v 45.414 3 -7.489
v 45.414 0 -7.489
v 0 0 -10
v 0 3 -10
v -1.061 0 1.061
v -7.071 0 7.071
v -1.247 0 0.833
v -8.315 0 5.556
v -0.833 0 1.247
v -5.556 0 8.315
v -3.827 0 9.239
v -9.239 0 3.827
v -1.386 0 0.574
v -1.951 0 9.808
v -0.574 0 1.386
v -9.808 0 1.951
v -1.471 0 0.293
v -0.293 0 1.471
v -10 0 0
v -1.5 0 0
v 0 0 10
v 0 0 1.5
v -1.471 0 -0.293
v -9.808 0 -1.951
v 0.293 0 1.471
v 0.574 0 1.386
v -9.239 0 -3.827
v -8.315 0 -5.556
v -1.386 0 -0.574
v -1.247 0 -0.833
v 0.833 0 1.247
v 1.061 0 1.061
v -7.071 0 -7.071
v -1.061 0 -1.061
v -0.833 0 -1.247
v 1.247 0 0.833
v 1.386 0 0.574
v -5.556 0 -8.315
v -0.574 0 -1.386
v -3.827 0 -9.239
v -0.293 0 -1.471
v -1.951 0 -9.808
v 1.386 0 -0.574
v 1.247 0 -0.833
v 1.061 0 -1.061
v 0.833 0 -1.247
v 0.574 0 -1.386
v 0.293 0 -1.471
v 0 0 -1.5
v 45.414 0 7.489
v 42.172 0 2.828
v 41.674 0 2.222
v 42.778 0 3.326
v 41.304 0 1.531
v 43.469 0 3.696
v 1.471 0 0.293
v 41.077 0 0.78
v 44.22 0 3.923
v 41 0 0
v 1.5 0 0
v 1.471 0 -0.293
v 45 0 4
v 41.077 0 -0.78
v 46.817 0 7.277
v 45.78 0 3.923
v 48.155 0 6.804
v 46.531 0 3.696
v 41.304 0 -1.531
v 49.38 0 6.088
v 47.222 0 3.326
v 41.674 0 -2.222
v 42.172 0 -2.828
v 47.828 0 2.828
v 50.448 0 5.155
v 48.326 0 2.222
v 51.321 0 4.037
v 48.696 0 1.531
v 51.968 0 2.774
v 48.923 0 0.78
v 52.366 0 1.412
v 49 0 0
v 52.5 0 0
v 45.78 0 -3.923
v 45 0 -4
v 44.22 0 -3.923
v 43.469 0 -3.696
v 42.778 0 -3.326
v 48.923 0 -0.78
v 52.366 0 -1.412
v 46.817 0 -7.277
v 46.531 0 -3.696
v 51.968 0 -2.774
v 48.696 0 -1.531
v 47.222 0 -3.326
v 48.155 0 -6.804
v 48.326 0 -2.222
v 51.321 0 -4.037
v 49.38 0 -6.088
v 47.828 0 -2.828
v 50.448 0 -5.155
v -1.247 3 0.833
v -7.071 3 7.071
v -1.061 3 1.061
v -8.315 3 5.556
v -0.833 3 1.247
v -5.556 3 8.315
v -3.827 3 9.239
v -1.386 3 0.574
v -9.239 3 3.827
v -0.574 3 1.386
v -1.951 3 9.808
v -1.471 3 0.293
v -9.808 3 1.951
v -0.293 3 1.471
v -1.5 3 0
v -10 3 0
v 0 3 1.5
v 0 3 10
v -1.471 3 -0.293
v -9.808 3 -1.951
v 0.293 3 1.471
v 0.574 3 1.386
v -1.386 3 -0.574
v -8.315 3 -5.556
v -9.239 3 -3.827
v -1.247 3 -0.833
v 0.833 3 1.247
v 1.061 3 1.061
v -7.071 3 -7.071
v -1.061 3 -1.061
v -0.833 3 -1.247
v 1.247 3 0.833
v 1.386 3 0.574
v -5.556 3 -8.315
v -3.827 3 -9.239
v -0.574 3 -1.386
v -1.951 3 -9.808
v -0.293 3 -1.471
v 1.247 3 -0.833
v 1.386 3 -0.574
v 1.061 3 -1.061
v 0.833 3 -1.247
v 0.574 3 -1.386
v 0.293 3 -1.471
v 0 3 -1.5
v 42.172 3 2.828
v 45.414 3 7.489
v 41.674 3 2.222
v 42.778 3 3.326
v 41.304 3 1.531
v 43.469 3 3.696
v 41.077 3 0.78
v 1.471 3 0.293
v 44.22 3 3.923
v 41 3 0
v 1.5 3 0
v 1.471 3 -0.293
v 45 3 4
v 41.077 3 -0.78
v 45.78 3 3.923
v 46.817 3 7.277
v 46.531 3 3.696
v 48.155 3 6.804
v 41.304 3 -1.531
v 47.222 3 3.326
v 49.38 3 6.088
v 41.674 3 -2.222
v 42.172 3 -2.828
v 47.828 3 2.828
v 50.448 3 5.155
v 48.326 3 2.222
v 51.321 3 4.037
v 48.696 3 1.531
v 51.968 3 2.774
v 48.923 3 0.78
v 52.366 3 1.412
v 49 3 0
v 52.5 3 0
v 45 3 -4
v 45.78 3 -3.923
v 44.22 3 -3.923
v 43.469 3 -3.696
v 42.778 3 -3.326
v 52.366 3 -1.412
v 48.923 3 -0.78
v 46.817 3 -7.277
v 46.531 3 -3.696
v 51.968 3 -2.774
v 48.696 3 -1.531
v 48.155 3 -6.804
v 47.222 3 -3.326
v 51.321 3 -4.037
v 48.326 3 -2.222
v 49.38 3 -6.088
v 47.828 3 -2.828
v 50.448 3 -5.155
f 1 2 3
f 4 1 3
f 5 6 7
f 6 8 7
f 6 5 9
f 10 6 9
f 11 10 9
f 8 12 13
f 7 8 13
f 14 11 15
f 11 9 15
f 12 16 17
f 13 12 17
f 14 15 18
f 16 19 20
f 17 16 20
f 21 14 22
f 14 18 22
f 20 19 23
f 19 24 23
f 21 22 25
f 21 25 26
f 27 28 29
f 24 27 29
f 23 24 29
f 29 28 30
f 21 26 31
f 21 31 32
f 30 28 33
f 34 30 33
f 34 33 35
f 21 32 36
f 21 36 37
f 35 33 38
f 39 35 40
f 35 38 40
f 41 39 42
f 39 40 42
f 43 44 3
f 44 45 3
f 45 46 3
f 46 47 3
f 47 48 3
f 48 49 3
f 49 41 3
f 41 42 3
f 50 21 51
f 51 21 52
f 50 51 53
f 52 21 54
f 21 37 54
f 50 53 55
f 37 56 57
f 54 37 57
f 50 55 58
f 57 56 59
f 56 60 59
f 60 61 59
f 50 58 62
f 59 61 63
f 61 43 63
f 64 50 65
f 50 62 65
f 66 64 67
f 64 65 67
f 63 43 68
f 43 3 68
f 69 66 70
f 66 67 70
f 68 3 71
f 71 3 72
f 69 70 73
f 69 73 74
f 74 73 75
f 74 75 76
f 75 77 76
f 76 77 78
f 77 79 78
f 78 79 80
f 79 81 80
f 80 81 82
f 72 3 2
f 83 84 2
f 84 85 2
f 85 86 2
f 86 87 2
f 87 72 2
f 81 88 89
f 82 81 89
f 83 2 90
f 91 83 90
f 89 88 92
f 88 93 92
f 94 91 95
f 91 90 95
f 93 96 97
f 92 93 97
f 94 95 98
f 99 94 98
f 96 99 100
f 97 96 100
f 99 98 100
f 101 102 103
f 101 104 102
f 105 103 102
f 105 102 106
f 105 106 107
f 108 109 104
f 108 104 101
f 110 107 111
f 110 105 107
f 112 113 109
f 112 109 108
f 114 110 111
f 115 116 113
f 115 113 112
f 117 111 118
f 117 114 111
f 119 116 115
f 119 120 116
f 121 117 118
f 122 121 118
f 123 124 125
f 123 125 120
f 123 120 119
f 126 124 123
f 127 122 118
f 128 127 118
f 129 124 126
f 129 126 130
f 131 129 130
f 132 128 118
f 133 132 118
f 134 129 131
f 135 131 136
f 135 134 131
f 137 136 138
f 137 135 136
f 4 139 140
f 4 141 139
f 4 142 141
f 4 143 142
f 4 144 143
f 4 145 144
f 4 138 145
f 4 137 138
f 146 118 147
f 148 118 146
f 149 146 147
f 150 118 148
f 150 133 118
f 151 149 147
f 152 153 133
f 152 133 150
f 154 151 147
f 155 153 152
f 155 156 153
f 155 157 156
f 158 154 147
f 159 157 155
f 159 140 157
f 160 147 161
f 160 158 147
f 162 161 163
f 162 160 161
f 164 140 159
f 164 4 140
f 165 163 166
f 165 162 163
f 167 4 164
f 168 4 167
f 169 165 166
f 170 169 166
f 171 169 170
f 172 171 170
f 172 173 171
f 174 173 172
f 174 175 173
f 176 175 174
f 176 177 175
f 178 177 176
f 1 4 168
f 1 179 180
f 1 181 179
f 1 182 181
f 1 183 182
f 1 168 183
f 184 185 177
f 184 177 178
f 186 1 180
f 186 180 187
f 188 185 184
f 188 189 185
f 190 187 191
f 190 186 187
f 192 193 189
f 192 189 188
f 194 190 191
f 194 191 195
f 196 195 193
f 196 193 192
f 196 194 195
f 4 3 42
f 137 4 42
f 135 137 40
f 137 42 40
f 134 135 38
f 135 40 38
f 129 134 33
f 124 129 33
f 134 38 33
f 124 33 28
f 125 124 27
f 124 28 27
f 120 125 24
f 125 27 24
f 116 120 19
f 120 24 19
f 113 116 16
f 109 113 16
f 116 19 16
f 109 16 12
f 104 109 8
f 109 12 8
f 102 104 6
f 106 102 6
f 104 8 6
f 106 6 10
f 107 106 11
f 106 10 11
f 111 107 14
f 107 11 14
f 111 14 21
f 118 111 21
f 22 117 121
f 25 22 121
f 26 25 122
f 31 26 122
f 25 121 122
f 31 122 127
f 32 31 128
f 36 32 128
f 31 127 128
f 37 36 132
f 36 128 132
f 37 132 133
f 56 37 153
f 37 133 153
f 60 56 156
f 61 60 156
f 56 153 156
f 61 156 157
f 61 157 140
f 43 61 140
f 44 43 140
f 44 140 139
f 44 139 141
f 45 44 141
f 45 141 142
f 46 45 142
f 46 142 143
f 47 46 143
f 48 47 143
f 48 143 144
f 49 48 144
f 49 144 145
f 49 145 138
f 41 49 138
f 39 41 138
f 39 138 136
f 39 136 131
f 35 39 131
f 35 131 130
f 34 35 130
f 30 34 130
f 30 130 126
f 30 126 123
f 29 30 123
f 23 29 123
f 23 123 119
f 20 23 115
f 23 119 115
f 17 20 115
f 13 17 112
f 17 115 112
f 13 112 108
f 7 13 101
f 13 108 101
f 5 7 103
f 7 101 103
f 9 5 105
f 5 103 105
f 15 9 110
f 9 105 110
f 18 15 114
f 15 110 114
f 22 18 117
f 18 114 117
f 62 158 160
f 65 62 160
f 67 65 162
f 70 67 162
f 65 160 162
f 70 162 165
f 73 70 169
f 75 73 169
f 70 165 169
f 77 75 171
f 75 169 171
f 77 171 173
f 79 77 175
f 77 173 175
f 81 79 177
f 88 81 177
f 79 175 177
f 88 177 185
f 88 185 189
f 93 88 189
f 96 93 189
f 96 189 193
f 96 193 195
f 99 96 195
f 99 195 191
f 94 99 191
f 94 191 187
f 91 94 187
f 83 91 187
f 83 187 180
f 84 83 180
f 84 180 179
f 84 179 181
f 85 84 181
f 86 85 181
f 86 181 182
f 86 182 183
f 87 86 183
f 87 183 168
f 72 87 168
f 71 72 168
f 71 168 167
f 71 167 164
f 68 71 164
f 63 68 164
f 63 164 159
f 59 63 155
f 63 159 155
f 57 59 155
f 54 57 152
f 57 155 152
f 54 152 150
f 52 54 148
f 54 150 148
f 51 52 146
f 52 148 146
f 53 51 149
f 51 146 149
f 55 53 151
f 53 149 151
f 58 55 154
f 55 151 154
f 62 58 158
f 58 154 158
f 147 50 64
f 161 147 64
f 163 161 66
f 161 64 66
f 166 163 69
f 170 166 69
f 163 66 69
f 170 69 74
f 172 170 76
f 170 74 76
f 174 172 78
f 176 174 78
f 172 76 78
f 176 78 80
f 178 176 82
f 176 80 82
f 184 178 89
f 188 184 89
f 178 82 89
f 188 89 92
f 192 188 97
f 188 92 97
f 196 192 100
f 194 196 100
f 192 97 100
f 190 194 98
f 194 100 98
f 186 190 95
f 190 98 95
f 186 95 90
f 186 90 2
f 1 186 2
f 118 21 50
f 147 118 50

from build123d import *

# Parameters (mm, degrees)
BOSS_EXTRUDE1_DEPTH = 3
CUT_EXTRUDE1_REACH  = 55.528
SKETCH2_R           = 1.5
SKETCH2_R_2         = 4


with BuildPart() as part:
    # Sketch1 → Boss-Extrude1 (new body)
    with BuildSketch(Plane(origin=(0, 0, 0), x_dir=(1, 0, 0), z_dir=(0, 1, 0))):
        with BuildLine():
            ThreePointArc((0, 10), (-10, 0), (0, -10))
            Line((0, -10), (45.414124006, -7.488558026))
            ThreePointArc((45.414124006, -7.488558026), (52.5, 0), (45.414124006, 7.488558026))
            Line((45.414124006, 7.488558026), (0, 10))
        make_face()
    extrude(amount=BOSS_EXTRUDE1_DEPTH)

    # Sketch2 → Cut-Extrude1 (cut, up to next)
    with BuildSketch(Plane(origin=(0, 3, 0), x_dir=(1, 0, 0), z_dir=(0, 1, 0)), mode=Mode.PRIVATE) as cut_extrude1_sk1:
        with Locations(Location((0, 0, 0), (0, 0, 270))):
            Circle(SKETCH2_R)
    cut_extrude1_tool1 = extrude(cut_extrude1_sk1.sketch, amount=-CUT_EXTRUDE1_REACH, mode=Mode.PRIVATE) & part.part
    # Sketch2 → Cut-Extrude1 (cut, up to next)
    with BuildSketch(Plane(origin=(0, 3, 0), x_dir=(1, 0, 0), z_dir=(0, 1, 0)), mode=Mode.PRIVATE) as cut_extrude1_sk2:
        with Locations(Location((45, 0, 0), (0, 0, 270))):
            Circle(SKETCH2_R_2)
    cut_extrude1_tool2 = extrude(cut_extrude1_sk2.sketch, amount=-CUT_EXTRUDE1_REACH, mode=Mode.PRIVATE) & part.part
    add(cut_extrude1_tool1.solids().sort_by_distance((0, 3, 0))[0], mode=Mode.SUBTRACT)
    add(cut_extrude1_tool2.solids().sort_by_distance((45, 3, 0))[0], mode=Mode.SUBTRACT)


solid = part.part
